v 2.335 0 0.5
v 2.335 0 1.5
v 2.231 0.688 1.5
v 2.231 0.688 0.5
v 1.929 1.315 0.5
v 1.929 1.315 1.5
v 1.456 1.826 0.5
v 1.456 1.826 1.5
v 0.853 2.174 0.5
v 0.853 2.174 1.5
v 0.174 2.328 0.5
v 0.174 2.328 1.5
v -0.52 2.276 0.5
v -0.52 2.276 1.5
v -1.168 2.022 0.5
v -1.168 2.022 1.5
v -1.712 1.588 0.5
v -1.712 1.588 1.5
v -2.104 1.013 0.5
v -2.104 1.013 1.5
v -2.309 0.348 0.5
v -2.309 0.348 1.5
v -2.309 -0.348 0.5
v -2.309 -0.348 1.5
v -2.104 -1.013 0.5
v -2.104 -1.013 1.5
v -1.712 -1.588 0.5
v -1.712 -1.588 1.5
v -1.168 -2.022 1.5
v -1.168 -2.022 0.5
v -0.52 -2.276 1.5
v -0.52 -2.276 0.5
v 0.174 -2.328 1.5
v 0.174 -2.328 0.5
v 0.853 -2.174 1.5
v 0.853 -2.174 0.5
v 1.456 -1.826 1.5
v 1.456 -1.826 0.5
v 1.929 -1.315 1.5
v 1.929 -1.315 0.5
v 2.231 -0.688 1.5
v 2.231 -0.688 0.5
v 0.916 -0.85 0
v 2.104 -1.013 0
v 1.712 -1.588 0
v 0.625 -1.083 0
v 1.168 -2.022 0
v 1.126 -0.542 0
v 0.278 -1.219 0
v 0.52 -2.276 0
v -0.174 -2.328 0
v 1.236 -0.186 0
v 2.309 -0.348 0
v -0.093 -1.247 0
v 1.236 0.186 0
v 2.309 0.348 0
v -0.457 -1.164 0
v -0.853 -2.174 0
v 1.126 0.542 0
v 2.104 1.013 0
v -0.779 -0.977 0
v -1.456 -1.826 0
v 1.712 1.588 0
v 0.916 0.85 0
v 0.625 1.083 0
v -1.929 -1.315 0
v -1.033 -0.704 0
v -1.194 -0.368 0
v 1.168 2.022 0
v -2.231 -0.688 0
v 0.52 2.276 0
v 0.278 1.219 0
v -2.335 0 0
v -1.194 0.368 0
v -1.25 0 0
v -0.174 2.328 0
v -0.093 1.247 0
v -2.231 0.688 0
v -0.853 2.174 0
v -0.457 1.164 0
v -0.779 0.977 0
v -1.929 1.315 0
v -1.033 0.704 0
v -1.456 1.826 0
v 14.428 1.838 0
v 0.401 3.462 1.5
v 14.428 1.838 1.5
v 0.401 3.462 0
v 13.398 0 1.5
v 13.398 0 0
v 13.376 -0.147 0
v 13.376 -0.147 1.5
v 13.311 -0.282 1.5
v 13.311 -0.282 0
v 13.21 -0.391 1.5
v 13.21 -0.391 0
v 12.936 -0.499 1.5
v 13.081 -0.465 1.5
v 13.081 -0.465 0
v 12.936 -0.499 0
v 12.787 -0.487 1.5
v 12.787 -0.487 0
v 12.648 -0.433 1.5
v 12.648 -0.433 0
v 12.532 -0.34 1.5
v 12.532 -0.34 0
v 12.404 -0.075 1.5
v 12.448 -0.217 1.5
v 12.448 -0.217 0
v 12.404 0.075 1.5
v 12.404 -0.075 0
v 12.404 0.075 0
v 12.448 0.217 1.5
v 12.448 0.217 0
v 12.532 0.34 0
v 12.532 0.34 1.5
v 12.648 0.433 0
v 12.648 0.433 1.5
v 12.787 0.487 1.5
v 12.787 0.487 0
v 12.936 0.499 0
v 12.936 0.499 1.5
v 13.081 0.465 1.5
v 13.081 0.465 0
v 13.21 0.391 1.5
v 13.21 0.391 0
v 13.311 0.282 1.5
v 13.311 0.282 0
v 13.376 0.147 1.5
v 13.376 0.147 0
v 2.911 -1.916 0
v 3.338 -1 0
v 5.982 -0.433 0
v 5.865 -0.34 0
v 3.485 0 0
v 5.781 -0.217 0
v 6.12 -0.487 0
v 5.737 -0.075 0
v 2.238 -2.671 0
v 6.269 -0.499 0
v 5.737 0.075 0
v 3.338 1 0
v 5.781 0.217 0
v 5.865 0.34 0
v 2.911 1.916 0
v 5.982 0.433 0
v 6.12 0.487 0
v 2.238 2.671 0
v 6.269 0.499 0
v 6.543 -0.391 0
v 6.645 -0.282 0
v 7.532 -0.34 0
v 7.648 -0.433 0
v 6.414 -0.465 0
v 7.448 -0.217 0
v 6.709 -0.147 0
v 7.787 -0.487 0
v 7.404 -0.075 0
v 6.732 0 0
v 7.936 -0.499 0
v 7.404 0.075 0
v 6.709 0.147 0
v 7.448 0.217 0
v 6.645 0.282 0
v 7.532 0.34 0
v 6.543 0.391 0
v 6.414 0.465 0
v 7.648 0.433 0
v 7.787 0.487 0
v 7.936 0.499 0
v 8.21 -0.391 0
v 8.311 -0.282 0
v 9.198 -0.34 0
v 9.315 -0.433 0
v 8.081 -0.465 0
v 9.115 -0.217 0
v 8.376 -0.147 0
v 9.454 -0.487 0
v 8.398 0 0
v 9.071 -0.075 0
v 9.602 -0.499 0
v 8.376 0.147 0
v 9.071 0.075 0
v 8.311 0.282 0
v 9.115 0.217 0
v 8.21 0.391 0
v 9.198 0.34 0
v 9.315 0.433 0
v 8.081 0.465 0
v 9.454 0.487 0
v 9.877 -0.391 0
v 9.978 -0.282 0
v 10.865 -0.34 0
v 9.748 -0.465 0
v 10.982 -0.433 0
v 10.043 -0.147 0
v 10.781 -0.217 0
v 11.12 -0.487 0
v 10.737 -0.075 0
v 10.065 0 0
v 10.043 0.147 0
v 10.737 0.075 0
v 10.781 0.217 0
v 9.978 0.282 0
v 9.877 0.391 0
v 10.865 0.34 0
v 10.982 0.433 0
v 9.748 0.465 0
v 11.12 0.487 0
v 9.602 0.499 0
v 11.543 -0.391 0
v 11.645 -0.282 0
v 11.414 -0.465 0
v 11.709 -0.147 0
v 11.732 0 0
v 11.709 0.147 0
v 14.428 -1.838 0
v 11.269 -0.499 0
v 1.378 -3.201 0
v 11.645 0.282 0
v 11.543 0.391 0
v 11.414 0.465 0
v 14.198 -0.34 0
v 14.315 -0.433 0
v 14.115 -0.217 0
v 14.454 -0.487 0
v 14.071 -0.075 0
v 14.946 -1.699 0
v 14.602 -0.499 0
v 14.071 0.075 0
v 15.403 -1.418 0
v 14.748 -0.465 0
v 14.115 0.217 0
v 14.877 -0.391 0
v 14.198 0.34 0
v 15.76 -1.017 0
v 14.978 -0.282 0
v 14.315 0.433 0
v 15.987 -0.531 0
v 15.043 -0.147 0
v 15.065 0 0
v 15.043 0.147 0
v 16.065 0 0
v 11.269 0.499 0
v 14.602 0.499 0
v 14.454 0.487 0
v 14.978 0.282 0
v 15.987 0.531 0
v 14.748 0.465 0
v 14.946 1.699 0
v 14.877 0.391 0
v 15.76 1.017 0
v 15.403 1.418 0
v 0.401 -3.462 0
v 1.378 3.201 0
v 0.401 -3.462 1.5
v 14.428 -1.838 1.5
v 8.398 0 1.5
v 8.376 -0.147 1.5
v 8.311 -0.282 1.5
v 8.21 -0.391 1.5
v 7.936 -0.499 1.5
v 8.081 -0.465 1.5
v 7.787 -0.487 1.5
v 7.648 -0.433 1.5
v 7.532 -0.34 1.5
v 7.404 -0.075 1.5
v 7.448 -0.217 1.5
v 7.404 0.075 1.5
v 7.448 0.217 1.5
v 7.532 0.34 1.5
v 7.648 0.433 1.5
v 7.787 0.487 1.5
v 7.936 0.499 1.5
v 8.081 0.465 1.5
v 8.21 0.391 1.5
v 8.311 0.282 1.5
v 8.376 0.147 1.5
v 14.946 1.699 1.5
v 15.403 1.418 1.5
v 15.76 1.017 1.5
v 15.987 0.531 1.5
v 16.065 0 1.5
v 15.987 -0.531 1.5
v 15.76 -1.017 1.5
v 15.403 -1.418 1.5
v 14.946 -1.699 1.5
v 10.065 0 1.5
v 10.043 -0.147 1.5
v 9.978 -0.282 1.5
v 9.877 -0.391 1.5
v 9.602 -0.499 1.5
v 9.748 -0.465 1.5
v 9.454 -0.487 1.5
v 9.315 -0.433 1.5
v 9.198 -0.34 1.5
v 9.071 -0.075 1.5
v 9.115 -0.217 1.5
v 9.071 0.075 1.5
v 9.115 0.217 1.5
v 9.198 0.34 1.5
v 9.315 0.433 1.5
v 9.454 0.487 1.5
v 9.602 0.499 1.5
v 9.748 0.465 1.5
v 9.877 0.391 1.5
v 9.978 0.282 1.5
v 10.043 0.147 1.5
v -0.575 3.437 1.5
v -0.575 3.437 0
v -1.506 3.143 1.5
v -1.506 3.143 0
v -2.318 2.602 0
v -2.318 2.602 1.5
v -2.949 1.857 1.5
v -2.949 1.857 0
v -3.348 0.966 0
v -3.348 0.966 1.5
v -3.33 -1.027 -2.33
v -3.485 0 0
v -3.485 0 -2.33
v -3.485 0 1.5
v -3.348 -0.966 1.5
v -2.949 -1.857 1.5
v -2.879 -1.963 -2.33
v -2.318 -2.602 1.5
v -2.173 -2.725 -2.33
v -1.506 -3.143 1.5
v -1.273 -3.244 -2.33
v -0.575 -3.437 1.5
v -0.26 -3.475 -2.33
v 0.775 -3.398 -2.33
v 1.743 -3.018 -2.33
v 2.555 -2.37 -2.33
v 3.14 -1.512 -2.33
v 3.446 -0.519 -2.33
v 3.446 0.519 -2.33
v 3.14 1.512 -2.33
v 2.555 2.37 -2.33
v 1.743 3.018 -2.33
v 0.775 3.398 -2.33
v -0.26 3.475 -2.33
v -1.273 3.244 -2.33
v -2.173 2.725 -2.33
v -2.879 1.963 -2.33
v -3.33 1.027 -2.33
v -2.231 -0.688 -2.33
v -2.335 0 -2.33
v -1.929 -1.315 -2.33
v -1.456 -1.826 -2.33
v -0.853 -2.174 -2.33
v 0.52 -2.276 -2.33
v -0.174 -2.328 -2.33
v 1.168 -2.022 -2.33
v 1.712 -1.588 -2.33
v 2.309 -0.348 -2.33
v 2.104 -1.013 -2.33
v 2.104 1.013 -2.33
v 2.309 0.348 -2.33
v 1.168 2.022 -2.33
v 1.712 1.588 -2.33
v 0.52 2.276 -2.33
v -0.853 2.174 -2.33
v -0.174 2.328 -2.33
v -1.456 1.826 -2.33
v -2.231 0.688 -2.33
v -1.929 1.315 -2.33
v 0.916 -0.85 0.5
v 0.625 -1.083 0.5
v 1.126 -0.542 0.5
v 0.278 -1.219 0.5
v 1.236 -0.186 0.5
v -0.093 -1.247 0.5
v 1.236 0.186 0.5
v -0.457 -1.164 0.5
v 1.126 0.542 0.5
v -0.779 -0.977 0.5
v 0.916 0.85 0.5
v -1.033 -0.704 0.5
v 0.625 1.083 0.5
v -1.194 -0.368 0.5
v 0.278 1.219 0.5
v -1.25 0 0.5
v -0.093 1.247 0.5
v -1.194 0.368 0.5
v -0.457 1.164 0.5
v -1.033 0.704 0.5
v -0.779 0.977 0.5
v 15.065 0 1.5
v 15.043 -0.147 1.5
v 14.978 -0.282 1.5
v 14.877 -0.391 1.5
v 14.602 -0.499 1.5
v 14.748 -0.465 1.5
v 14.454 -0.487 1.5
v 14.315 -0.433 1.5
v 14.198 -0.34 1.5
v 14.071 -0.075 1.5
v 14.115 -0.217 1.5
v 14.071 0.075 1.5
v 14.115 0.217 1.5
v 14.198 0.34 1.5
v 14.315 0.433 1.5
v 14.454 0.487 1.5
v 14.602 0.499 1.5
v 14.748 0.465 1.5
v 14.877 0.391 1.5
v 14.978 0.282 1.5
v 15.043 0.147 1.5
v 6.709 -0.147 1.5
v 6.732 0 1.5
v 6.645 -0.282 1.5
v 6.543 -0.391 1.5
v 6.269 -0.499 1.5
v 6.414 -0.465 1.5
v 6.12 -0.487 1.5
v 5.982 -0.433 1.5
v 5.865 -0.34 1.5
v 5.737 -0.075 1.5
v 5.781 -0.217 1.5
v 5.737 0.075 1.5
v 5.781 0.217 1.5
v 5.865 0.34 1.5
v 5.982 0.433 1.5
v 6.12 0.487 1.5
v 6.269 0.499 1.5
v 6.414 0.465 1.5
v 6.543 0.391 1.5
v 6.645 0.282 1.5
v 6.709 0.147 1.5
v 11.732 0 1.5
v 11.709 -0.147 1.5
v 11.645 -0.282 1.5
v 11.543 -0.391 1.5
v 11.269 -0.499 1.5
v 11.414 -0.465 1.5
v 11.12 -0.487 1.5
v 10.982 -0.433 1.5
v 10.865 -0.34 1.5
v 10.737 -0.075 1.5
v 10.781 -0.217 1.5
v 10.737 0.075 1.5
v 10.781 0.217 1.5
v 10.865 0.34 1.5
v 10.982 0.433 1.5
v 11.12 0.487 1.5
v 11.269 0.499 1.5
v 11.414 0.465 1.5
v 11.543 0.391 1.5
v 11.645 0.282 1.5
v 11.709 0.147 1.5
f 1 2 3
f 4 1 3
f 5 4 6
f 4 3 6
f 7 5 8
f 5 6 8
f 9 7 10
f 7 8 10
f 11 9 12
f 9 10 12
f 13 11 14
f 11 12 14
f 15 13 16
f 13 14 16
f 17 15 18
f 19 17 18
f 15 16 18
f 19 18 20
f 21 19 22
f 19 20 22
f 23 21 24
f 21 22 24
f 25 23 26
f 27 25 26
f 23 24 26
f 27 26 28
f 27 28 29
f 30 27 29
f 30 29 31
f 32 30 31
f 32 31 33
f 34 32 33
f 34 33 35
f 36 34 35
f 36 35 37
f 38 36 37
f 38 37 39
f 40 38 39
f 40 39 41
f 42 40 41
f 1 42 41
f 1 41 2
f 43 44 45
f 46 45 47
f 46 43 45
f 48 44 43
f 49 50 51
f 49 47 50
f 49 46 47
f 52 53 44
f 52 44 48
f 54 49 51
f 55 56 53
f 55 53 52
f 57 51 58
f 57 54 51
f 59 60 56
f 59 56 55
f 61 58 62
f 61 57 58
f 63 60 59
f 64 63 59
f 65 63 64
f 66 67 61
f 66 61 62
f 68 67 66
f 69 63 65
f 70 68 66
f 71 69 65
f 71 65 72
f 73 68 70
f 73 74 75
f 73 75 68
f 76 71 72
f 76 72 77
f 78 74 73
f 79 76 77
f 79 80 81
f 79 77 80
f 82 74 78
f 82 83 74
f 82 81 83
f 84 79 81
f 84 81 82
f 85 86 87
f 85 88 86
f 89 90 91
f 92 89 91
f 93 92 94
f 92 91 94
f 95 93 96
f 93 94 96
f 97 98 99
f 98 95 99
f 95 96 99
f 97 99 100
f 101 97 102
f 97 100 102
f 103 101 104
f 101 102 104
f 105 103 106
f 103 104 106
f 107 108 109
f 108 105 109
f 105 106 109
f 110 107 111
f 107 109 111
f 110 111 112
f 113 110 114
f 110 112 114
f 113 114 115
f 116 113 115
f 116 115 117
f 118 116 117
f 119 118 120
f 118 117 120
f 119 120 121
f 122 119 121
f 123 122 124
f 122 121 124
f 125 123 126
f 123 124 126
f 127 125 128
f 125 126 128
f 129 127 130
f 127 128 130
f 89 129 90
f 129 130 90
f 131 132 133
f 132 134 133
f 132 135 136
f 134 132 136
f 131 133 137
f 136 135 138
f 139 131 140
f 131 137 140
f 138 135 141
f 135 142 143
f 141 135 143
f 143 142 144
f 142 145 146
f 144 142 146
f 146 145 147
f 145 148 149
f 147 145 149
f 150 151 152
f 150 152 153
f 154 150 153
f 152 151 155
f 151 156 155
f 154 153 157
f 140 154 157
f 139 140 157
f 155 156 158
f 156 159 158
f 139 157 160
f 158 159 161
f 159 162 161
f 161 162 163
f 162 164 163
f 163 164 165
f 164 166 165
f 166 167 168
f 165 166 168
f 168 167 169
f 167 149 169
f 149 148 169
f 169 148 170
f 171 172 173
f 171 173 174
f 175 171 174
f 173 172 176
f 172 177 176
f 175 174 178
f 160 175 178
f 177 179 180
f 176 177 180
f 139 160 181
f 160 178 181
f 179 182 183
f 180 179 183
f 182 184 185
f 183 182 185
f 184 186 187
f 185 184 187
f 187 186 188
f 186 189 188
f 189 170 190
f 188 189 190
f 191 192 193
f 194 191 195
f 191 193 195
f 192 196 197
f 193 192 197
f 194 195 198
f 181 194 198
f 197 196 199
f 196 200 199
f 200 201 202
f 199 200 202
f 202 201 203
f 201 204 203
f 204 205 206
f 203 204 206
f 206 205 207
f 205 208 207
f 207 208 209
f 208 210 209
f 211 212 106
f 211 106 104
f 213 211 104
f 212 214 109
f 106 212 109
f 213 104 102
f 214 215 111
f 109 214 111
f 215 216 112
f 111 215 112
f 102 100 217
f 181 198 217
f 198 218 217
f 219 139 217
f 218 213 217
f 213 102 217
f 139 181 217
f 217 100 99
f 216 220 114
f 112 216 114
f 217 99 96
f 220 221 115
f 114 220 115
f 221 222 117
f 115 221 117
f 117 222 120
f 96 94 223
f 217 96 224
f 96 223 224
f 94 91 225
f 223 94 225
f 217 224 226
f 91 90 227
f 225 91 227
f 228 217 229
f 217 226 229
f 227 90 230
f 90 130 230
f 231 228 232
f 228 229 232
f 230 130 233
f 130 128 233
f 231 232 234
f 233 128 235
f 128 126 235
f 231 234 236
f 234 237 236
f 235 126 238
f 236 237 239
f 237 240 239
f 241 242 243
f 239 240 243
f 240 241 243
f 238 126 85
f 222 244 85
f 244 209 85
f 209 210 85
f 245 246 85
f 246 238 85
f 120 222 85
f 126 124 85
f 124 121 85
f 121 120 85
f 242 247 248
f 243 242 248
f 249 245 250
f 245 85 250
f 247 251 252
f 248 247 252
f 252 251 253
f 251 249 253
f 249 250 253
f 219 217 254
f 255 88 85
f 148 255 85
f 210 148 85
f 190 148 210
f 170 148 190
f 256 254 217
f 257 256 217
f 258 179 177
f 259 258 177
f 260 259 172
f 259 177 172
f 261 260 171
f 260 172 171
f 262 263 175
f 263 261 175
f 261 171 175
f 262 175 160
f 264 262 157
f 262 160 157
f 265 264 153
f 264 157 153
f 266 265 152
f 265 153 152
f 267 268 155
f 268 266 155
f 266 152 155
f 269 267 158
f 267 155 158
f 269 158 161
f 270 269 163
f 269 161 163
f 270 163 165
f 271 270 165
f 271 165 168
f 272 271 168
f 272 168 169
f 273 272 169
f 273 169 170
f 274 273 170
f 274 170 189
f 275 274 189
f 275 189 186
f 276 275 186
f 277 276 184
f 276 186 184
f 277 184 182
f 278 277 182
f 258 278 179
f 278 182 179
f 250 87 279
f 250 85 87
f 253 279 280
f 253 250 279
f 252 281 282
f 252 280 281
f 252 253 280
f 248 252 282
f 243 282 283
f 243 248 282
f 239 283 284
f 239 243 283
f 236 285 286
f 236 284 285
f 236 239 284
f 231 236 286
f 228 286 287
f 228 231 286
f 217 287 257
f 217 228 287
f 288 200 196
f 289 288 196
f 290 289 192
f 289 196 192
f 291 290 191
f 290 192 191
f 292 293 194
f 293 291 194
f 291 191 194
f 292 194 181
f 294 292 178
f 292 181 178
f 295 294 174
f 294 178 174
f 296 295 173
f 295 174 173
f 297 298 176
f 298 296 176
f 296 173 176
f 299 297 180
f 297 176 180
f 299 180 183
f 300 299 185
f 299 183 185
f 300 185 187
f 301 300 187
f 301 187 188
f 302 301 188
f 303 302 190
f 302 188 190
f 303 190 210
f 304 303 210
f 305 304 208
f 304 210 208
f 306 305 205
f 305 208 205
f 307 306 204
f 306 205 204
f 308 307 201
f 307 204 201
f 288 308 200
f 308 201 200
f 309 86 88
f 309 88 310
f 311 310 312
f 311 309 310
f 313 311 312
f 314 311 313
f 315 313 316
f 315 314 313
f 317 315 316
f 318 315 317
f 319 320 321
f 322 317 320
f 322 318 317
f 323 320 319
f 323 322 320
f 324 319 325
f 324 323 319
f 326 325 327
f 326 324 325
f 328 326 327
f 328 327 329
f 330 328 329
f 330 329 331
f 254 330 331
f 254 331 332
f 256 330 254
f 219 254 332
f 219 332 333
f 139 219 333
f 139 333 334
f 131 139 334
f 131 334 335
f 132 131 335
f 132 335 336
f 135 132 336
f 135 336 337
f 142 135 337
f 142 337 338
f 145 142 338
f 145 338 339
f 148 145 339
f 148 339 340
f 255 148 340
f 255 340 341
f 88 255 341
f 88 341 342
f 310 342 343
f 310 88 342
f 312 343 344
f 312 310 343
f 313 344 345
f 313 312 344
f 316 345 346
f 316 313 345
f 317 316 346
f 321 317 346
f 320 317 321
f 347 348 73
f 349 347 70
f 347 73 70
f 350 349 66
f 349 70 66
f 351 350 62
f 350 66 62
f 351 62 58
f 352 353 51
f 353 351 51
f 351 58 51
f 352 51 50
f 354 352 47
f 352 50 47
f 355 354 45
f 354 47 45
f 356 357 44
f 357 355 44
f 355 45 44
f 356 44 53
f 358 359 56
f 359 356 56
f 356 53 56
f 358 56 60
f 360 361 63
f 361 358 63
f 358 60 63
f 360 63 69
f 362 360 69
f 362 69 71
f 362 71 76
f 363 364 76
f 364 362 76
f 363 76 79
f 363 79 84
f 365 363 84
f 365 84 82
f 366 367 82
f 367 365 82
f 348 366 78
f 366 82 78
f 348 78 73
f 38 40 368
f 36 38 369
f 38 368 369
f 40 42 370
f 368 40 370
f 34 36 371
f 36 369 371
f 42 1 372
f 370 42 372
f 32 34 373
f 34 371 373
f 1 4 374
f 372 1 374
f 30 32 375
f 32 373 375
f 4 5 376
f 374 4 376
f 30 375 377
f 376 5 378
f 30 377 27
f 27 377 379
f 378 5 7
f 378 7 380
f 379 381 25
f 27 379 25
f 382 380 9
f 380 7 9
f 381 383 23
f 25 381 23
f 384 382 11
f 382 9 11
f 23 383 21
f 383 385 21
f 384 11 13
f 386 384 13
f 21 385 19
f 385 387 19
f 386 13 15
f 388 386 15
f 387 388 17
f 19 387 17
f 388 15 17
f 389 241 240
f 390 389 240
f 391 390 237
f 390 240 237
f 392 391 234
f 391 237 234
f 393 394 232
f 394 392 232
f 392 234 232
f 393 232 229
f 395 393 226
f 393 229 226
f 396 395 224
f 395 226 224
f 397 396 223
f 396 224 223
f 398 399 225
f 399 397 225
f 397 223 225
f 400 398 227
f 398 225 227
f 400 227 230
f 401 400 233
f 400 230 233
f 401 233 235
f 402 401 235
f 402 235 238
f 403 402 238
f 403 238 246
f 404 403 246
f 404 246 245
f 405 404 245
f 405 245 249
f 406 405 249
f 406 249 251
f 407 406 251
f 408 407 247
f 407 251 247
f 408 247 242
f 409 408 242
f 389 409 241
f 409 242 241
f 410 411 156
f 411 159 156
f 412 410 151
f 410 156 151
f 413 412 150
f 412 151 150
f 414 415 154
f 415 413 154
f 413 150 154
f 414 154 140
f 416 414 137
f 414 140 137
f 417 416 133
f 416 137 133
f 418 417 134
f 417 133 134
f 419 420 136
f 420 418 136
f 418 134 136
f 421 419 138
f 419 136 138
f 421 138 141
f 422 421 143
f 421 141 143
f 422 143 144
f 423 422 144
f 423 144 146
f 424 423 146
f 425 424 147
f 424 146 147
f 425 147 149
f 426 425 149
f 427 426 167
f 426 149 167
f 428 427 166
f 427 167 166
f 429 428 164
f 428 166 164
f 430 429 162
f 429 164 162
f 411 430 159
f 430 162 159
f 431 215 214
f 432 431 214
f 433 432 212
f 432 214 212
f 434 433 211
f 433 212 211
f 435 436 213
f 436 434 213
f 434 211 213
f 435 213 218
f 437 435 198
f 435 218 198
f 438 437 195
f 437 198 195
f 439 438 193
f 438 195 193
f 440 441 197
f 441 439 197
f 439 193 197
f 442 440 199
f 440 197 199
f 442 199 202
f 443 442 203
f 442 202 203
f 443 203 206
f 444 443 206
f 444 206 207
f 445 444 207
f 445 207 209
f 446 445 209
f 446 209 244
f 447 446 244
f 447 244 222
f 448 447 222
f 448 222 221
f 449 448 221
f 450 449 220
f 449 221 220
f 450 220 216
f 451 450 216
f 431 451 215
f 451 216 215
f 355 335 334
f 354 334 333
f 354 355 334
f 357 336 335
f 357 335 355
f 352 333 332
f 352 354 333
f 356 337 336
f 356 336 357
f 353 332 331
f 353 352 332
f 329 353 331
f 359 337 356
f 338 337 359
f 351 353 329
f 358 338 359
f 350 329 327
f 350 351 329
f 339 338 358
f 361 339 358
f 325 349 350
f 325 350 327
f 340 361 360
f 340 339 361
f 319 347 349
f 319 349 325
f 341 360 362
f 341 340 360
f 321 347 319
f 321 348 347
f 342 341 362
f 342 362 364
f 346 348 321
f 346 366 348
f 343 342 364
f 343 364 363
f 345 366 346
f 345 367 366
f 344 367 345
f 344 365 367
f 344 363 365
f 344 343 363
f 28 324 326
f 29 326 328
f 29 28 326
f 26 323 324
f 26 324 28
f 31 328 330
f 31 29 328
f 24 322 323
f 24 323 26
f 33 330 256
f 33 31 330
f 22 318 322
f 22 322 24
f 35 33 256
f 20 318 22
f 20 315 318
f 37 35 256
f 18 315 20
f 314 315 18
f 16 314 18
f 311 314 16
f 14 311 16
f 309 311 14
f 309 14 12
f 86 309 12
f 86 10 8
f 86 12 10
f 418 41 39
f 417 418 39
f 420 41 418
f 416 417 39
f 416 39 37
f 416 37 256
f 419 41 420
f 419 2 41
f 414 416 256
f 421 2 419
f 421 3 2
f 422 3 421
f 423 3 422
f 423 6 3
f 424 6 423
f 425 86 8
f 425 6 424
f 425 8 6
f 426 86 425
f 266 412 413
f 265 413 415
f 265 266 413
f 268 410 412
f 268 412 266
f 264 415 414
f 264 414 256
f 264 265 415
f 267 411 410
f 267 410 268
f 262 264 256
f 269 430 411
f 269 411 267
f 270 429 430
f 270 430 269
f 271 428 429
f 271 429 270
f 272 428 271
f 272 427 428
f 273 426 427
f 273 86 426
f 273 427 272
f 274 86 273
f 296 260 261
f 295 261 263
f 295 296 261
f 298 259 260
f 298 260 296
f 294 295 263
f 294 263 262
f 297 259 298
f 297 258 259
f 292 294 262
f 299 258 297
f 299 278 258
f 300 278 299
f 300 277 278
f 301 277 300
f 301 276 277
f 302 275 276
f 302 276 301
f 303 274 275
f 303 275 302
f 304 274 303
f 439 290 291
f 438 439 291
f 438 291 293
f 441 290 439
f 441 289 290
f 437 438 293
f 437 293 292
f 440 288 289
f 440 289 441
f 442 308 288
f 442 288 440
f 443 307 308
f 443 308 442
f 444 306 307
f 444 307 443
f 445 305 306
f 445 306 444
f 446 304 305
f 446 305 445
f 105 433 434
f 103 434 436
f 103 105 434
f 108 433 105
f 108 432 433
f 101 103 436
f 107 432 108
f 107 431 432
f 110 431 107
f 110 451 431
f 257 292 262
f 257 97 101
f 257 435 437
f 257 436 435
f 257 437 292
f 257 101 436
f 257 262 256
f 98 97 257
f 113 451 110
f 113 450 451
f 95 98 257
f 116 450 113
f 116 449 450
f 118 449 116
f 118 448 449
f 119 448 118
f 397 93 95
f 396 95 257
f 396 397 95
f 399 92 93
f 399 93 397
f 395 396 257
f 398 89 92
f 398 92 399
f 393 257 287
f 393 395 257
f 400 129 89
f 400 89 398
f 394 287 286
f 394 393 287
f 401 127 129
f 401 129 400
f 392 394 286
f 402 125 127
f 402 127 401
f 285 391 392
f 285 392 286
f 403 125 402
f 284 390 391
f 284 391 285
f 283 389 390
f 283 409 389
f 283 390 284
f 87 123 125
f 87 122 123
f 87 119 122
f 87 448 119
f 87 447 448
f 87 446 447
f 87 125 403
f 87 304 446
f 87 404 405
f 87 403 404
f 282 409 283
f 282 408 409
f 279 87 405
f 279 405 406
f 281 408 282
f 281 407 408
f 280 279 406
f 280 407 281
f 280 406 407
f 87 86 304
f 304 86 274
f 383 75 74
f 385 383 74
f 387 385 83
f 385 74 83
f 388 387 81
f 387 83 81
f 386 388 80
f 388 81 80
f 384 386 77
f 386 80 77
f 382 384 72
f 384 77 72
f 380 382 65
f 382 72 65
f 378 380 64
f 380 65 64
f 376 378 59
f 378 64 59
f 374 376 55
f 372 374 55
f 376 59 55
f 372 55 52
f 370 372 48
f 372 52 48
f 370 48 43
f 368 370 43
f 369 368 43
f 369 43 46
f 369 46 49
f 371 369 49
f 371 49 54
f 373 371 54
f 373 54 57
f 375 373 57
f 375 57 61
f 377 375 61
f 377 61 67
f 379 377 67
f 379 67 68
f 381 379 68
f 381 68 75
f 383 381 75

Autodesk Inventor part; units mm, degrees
ref_plane "YZ Plane" through (0, 0, 0) normal (1, 0, 0) x (0, 1, 0)
ref_plane "XZ Plane" through (0, 0, 0) normal (0, 1, 0) x (-1, 0, 0)
ref_plane "XY Plane" through (0, 0, 0) normal (0, 0, 1) x (1, 0, 0)
sketch "Sketch1" plane through (0, 0, 0) normal (0, 0, 1) x (1, 0, 0)
  circle A0 centre (0, 0) radius 3.485
  arc A1 (14.4278, -1.8377) -> (14.4278, 1.8377) centre (14.215, 0) ccw
  line L0 (0.4008, 3.4619) -> (14.4278, 1.8377)
  line L1 (0.4008, -3.4619) -> (14.4278, -1.8377)
  line L2 (0, 0) -> (14.215, 0) construction
  line L3 (16.065, 5.1941) -> (16.065, -8.7582) construction
  line L4 (-3.485, 10.888) -> (-3.485, -12.1485) construction
  circle A2 centre (6.2317, 0) radius 0.5
  circle A3 centre (7.8983, 0) radius 0.5
  circle A4 centre (9.565, 0) radius 0.5
  circle A5 centre (11.2317, 0) radius 0.5
  circle A6 centre (12.8983, 0) radius 0.5
  circle A7 centre (14.565, 0) radius 0.5
  dimension "d1" = 19.55
  dimension "d2" = 1.85
  dimension "d3" = 6.97
  dimension "d4" = 1
  dimension "d7" = 1.6667
  dimension "d12" = 1.5
extrude "Extrusion1" add sketch "Sketch1" along normal blind 1.5
sketch "Sketch2" plane through (0, 0, 1.5) normal (0, 0, 1) x (1, 0, 0)
  arc A0 (0.4008, 3.4619) -> (0.4008, -3.4619) centre (0, 0) ccw projected
  circle A1 centre (0, 0) radius 1.25
  circle A2 centre (0, 0) radius 2.335
  dimension "d15" = 4.67
  dimension "d16" = 2.5
extrude "Extrusion2" cut sketch "Sketch2" against normal blind 1.5 contours A1 | A2
sketch "Sketch3" plane through (0, 0, 0) normal (0, 0, -1) x (-1, 0, 0)
  circle A0 centre (0, 0) radius 2.335 projected
  circle A1 centre (0, 0) radius 3.485
  line L0 (-0.4008, -3.4619) -> (-14.4278, -1.8377) projected
extrude "Extrusion3" add sketch "Sketch3" along normal blind 2.33
sketch "Sketch4" plane through (0, 0, 0) normal (0, 0, -1) x (-1, 0, 0)
  circle A0 centre (0, 0) radius 1.25
  circle A1 centre (0, 0) radius 3.485
  circle A2 centre (0, 0) radius 3.485 projected
  dimension "d21" = 2.5
extrude "Extrusion4" add sketch "Sketch4" against normal blind 0.5
properties part number "servo-horn-b"
